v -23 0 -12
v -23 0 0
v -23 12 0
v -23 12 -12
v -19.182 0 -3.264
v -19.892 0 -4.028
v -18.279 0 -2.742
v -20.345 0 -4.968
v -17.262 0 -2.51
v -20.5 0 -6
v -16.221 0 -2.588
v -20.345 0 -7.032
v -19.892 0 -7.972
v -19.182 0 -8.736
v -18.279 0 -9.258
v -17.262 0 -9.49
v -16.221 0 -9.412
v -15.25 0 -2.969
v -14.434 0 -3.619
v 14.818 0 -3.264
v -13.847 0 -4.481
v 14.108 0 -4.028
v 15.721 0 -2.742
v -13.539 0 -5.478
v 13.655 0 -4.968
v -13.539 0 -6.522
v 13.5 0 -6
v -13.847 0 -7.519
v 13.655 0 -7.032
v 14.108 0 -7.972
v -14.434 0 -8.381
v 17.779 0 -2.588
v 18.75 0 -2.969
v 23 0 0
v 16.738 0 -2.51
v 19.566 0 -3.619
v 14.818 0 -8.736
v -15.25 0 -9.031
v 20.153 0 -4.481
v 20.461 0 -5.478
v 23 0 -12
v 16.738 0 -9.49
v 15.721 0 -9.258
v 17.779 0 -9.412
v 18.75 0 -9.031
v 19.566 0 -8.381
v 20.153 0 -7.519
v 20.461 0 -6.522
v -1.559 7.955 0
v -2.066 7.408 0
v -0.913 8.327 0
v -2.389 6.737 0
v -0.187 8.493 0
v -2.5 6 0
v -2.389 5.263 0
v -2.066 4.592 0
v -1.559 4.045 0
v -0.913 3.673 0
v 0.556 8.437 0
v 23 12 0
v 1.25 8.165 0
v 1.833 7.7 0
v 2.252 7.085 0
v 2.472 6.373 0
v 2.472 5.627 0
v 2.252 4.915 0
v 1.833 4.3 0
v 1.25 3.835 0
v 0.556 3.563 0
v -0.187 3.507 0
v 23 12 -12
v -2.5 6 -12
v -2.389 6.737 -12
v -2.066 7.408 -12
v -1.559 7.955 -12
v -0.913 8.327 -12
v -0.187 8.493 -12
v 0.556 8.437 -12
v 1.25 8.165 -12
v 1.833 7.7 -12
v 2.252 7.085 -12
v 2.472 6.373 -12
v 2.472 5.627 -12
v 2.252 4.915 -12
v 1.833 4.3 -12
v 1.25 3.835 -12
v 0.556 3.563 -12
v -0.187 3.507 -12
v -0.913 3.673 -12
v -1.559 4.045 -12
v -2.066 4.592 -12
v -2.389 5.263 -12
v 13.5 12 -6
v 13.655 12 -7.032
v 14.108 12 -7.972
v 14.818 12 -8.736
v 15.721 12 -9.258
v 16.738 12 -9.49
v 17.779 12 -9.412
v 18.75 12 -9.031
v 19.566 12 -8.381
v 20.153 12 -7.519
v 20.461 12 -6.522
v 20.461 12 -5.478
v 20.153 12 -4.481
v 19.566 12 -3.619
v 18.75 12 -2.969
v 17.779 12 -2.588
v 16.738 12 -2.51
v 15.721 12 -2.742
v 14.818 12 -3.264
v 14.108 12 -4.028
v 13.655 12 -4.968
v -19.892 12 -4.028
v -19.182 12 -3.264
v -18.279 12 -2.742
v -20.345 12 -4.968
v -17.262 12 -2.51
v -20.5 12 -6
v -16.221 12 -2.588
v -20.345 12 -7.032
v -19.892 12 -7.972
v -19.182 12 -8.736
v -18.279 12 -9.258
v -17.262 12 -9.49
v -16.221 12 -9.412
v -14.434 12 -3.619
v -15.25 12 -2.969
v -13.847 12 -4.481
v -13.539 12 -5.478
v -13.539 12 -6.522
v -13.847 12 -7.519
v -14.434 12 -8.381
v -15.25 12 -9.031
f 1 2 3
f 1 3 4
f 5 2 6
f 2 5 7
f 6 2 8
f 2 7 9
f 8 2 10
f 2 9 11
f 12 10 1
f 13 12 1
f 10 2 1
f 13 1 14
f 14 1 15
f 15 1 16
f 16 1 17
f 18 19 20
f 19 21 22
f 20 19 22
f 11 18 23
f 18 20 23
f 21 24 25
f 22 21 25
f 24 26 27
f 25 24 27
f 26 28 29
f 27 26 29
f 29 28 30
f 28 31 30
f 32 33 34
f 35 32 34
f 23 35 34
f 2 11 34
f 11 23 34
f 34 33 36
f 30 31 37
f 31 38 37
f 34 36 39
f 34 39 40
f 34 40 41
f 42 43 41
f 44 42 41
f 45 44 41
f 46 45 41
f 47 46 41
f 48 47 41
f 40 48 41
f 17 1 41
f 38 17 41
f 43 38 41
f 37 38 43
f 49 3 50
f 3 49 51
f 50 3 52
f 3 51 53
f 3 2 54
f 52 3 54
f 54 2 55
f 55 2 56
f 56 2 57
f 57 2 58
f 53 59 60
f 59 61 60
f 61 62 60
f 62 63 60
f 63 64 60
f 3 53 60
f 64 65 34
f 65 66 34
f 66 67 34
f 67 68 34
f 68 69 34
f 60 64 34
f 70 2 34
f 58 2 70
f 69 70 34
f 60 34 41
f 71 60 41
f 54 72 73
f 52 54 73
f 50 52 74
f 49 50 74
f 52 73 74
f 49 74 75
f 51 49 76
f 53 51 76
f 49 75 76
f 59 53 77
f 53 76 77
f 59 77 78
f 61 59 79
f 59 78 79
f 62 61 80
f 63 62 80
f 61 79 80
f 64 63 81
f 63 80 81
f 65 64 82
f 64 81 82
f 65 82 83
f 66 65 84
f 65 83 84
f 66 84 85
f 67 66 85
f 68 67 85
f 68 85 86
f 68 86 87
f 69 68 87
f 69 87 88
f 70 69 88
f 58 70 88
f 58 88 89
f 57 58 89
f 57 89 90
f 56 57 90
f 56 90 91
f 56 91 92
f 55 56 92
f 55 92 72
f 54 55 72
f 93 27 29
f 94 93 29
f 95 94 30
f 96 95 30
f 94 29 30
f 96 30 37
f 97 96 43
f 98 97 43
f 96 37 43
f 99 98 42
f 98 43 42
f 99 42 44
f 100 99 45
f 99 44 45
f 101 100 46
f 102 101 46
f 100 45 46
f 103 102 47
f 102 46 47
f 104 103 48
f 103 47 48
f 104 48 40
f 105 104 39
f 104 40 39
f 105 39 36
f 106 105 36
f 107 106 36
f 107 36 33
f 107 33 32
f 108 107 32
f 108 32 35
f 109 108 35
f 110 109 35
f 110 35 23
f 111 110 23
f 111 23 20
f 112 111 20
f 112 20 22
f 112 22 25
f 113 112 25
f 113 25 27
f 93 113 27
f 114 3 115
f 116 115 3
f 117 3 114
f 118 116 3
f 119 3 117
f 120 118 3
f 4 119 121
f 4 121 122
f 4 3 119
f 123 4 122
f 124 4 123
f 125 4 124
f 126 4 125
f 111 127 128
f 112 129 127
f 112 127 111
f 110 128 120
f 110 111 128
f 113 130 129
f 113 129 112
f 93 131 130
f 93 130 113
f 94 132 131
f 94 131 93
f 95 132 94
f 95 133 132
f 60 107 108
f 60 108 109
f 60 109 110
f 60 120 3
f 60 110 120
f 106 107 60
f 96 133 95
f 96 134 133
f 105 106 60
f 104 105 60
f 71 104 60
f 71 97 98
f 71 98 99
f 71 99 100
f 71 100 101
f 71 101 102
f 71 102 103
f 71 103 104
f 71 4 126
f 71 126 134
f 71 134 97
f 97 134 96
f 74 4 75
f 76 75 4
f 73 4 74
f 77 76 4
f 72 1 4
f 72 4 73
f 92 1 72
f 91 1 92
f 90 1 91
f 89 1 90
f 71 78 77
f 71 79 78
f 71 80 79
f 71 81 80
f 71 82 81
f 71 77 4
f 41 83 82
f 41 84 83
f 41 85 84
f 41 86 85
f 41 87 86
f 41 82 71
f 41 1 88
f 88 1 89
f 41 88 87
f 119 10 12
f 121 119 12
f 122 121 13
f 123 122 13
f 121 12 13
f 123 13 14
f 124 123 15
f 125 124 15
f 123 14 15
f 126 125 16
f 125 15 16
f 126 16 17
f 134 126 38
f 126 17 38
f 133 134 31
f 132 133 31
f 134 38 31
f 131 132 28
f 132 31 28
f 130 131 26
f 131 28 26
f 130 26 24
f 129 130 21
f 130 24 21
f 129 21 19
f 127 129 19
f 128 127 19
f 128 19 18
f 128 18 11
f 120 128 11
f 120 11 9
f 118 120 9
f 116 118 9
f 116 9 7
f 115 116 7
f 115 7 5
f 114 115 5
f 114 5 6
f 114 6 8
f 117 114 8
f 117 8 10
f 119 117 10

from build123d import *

# Parameters (mm, degrees)
SKETCH1_W                = 46
SKETCH1_H                = 12
BOSS_EXTRUDE1_DEPTH      = 12
F_7_0_7_DIAMETER_HOLE1_D = 7
M6X1_0_TAPPED_HOLE1_D    = 5


with BuildPart() as part:
    # Sketch1 → Boss-Extrude1 (new body)
    with BuildSketch(Plane(origin=(0, 0, 0), x_dir=(1, 0, 0), z_dir=(0, 1, 0))):
        with Locations((0, 6)):
            Rectangle(SKETCH1_W, SKETCH1_H)
    extrude(amount=BOSS_EXTRUDE1_DEPTH)

    # Ø7.0 (7) Diameter Hole1 (through all)
    with Locations(Plane(origin=(-8.628001273, 12, -9.044925154), x_dir=(1, 0, 0), z_dir=(0, 1, 0))):
        with Locations((25.628001273, -3.044925154), (-8.371998727, -3.044925154)):
            Hole(F_7_0_7_DIAMETER_HOLE1_D / 2)

    # M6x1.0 Tapped Hole1 (through all)
    with Locations(Plane.XY):
        with Locations((0, 6)):
            Hole(M6X1_0_TAPPED_HOLE1_D / 2)


solid = part.part
